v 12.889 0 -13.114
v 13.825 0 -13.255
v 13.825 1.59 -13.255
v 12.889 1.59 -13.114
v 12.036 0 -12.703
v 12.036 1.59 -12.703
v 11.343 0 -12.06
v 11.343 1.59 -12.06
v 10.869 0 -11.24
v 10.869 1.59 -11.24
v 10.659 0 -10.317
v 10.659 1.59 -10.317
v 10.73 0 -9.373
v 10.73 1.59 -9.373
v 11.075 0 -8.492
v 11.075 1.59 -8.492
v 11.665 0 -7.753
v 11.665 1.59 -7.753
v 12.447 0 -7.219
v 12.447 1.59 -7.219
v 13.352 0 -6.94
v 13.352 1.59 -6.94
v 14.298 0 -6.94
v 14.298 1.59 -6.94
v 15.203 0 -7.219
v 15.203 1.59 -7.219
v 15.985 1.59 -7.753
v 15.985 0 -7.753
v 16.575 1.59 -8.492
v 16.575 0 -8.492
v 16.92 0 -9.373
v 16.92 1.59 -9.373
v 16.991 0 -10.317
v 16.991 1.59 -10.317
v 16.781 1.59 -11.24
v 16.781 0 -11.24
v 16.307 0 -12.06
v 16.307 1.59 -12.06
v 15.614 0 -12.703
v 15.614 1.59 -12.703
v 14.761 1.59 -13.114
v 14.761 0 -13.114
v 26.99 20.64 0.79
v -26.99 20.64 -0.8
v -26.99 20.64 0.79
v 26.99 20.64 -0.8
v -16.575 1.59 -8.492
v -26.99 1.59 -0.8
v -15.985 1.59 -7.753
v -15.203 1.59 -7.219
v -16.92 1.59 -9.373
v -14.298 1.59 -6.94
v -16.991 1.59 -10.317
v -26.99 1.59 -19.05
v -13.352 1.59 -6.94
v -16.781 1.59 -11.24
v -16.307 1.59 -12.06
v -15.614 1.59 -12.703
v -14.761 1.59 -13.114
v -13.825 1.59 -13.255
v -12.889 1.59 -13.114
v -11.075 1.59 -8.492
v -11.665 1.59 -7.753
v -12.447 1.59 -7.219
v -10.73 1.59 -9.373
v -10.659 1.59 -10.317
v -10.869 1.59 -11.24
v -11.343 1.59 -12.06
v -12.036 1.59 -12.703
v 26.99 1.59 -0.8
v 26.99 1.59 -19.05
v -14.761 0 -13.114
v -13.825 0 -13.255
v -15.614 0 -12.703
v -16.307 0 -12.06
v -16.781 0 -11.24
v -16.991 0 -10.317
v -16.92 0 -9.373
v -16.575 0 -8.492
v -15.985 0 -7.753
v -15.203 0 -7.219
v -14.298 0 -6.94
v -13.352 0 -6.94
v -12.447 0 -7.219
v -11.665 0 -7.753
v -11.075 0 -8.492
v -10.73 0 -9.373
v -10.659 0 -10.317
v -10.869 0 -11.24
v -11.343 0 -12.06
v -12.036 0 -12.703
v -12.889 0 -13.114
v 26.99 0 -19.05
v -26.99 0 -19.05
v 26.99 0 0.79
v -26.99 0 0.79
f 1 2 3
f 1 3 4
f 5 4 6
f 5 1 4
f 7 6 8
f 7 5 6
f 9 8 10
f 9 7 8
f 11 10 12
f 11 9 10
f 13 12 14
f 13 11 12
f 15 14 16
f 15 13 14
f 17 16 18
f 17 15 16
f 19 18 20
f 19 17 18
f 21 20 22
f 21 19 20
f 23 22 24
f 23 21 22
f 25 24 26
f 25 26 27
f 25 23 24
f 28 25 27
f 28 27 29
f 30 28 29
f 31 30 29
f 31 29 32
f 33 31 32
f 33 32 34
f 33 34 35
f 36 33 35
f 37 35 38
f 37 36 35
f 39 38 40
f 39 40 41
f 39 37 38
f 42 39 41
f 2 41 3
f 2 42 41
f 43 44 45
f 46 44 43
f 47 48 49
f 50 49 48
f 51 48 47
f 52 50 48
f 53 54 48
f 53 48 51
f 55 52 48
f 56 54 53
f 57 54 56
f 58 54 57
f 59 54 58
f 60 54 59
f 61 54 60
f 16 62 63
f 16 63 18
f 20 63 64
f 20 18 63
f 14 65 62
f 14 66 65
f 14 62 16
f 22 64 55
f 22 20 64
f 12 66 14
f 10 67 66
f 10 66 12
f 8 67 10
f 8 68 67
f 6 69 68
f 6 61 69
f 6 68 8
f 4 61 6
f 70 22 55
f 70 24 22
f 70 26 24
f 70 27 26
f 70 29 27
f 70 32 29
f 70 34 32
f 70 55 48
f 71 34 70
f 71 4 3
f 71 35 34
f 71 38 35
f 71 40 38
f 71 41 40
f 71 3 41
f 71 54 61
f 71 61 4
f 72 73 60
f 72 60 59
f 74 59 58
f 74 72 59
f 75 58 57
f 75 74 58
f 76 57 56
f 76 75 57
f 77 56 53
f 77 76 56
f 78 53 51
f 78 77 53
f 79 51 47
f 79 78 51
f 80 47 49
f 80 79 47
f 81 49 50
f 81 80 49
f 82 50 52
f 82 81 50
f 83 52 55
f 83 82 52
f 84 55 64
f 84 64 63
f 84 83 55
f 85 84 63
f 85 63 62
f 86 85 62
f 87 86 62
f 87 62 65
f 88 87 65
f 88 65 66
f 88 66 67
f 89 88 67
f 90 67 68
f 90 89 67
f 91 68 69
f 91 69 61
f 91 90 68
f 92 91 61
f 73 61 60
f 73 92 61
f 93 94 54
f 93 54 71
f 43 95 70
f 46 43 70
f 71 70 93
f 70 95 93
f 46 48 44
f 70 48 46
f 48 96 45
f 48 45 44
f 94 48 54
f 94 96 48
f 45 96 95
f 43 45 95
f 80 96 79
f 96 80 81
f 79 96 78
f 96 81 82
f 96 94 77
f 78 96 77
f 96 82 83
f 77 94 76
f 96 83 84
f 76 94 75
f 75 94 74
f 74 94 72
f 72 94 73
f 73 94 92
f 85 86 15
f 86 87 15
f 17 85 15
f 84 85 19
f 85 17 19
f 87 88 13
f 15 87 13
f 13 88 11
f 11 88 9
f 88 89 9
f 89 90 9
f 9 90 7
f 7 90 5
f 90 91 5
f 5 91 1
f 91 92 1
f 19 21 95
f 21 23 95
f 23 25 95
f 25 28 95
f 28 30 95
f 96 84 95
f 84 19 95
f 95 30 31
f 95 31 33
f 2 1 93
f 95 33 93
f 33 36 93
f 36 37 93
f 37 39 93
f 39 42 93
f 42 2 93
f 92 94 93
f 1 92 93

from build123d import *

# Parameters (mm, degrees)
SKETCH1_W               = 53.98
SKETCH1_H               = 1.59
BOSS_EXTRUDE1_DEPTH     = 20.64
SKETCH1_3_W             = 53.98
SKETCH1_3_H             = 18.26
SKETCH1_3_R             = 3.175
SKETCH1_3_H_2           = 18.25
BOSS_EXTRUDE2_DEPTH     = 1.59
CUT_EXTRUDE1_DEPTH      = 39.134827914
CUT_EXTRUDE1_DEPTH_BACK = 39.134827914
SKETCH3_W               = 53.98
SKETCH3_H               = 18.26


with BuildPart() as part:
    # Sketch1 → Boss-Extrude1 (new body)
    with BuildSketch(Plane(origin=(0, 0, 0), x_dir=(1, 0, 0), z_dir=(0, 1, 0))):
        with Locations((0, 0.005)):
            Rectangle(SKETCH1_W, SKETCH1_H)
    extrude(amount=BOSS_EXTRUDE1_DEPTH)

    # Sketch1<3> → Boss-Extrude2 (add)
    # profile 1 of 2: a face of its own
    with BuildSketch(Plane(origin=(0, 0, 0), x_dir=(1, 0, 0), z_dir=(0, 1, 0))):
        with Locations((0, -9.92)):
            Rectangle(SKETCH1_3_W, SKETCH1_3_H)
        with Locations((-13.825, -10.08)):
            Circle(SKETCH1_3_R, mode=Mode.SUBTRACT)
        with Locations((13.825, -10.08)):
            Circle(SKETCH1_3_R, mode=Mode.SUBTRACT)
    # profile 2 of 2: a face of its own
    with BuildSketch(Plane(origin=(0, 0, 0), x_dir=(1, 0, 0), z_dir=(0, 1, 0))):
        with Locations((0, 9.925)):
            Rectangle(SKETCH1_3_W, SKETCH1_3_H_2)
        with Locations((-13.825, 10.08)):
            Circle(SKETCH1_3_R, mode=Mode.SUBTRACT)
        with Locations((13.825, 10.08)):
            Circle(SKETCH1_3_R, mode=Mode.SUBTRACT)
    extrude(amount=BOSS_EXTRUDE2_DEPTH)

    # Sketch3 → Cut-Extrude1 (cut, two sides: drawn at the far end of the back side and taken through both)
    with BuildSketch(Plane(origin=(0, 1.59, 0), x_dir=(1, 0, 0), z_dir=(0, 1, 0)).offset(-CUT_EXTRUDE1_DEPTH_BACK)):
        with Locations((0, -9.92)):
            Rectangle(SKETCH3_W, SKETCH3_H)
    extrude(amount=CUT_EXTRUDE1_DEPTH + CUT_EXTRUDE1_DEPTH_BACK, mode=Mode.SUBTRACT)


solid = part.part
